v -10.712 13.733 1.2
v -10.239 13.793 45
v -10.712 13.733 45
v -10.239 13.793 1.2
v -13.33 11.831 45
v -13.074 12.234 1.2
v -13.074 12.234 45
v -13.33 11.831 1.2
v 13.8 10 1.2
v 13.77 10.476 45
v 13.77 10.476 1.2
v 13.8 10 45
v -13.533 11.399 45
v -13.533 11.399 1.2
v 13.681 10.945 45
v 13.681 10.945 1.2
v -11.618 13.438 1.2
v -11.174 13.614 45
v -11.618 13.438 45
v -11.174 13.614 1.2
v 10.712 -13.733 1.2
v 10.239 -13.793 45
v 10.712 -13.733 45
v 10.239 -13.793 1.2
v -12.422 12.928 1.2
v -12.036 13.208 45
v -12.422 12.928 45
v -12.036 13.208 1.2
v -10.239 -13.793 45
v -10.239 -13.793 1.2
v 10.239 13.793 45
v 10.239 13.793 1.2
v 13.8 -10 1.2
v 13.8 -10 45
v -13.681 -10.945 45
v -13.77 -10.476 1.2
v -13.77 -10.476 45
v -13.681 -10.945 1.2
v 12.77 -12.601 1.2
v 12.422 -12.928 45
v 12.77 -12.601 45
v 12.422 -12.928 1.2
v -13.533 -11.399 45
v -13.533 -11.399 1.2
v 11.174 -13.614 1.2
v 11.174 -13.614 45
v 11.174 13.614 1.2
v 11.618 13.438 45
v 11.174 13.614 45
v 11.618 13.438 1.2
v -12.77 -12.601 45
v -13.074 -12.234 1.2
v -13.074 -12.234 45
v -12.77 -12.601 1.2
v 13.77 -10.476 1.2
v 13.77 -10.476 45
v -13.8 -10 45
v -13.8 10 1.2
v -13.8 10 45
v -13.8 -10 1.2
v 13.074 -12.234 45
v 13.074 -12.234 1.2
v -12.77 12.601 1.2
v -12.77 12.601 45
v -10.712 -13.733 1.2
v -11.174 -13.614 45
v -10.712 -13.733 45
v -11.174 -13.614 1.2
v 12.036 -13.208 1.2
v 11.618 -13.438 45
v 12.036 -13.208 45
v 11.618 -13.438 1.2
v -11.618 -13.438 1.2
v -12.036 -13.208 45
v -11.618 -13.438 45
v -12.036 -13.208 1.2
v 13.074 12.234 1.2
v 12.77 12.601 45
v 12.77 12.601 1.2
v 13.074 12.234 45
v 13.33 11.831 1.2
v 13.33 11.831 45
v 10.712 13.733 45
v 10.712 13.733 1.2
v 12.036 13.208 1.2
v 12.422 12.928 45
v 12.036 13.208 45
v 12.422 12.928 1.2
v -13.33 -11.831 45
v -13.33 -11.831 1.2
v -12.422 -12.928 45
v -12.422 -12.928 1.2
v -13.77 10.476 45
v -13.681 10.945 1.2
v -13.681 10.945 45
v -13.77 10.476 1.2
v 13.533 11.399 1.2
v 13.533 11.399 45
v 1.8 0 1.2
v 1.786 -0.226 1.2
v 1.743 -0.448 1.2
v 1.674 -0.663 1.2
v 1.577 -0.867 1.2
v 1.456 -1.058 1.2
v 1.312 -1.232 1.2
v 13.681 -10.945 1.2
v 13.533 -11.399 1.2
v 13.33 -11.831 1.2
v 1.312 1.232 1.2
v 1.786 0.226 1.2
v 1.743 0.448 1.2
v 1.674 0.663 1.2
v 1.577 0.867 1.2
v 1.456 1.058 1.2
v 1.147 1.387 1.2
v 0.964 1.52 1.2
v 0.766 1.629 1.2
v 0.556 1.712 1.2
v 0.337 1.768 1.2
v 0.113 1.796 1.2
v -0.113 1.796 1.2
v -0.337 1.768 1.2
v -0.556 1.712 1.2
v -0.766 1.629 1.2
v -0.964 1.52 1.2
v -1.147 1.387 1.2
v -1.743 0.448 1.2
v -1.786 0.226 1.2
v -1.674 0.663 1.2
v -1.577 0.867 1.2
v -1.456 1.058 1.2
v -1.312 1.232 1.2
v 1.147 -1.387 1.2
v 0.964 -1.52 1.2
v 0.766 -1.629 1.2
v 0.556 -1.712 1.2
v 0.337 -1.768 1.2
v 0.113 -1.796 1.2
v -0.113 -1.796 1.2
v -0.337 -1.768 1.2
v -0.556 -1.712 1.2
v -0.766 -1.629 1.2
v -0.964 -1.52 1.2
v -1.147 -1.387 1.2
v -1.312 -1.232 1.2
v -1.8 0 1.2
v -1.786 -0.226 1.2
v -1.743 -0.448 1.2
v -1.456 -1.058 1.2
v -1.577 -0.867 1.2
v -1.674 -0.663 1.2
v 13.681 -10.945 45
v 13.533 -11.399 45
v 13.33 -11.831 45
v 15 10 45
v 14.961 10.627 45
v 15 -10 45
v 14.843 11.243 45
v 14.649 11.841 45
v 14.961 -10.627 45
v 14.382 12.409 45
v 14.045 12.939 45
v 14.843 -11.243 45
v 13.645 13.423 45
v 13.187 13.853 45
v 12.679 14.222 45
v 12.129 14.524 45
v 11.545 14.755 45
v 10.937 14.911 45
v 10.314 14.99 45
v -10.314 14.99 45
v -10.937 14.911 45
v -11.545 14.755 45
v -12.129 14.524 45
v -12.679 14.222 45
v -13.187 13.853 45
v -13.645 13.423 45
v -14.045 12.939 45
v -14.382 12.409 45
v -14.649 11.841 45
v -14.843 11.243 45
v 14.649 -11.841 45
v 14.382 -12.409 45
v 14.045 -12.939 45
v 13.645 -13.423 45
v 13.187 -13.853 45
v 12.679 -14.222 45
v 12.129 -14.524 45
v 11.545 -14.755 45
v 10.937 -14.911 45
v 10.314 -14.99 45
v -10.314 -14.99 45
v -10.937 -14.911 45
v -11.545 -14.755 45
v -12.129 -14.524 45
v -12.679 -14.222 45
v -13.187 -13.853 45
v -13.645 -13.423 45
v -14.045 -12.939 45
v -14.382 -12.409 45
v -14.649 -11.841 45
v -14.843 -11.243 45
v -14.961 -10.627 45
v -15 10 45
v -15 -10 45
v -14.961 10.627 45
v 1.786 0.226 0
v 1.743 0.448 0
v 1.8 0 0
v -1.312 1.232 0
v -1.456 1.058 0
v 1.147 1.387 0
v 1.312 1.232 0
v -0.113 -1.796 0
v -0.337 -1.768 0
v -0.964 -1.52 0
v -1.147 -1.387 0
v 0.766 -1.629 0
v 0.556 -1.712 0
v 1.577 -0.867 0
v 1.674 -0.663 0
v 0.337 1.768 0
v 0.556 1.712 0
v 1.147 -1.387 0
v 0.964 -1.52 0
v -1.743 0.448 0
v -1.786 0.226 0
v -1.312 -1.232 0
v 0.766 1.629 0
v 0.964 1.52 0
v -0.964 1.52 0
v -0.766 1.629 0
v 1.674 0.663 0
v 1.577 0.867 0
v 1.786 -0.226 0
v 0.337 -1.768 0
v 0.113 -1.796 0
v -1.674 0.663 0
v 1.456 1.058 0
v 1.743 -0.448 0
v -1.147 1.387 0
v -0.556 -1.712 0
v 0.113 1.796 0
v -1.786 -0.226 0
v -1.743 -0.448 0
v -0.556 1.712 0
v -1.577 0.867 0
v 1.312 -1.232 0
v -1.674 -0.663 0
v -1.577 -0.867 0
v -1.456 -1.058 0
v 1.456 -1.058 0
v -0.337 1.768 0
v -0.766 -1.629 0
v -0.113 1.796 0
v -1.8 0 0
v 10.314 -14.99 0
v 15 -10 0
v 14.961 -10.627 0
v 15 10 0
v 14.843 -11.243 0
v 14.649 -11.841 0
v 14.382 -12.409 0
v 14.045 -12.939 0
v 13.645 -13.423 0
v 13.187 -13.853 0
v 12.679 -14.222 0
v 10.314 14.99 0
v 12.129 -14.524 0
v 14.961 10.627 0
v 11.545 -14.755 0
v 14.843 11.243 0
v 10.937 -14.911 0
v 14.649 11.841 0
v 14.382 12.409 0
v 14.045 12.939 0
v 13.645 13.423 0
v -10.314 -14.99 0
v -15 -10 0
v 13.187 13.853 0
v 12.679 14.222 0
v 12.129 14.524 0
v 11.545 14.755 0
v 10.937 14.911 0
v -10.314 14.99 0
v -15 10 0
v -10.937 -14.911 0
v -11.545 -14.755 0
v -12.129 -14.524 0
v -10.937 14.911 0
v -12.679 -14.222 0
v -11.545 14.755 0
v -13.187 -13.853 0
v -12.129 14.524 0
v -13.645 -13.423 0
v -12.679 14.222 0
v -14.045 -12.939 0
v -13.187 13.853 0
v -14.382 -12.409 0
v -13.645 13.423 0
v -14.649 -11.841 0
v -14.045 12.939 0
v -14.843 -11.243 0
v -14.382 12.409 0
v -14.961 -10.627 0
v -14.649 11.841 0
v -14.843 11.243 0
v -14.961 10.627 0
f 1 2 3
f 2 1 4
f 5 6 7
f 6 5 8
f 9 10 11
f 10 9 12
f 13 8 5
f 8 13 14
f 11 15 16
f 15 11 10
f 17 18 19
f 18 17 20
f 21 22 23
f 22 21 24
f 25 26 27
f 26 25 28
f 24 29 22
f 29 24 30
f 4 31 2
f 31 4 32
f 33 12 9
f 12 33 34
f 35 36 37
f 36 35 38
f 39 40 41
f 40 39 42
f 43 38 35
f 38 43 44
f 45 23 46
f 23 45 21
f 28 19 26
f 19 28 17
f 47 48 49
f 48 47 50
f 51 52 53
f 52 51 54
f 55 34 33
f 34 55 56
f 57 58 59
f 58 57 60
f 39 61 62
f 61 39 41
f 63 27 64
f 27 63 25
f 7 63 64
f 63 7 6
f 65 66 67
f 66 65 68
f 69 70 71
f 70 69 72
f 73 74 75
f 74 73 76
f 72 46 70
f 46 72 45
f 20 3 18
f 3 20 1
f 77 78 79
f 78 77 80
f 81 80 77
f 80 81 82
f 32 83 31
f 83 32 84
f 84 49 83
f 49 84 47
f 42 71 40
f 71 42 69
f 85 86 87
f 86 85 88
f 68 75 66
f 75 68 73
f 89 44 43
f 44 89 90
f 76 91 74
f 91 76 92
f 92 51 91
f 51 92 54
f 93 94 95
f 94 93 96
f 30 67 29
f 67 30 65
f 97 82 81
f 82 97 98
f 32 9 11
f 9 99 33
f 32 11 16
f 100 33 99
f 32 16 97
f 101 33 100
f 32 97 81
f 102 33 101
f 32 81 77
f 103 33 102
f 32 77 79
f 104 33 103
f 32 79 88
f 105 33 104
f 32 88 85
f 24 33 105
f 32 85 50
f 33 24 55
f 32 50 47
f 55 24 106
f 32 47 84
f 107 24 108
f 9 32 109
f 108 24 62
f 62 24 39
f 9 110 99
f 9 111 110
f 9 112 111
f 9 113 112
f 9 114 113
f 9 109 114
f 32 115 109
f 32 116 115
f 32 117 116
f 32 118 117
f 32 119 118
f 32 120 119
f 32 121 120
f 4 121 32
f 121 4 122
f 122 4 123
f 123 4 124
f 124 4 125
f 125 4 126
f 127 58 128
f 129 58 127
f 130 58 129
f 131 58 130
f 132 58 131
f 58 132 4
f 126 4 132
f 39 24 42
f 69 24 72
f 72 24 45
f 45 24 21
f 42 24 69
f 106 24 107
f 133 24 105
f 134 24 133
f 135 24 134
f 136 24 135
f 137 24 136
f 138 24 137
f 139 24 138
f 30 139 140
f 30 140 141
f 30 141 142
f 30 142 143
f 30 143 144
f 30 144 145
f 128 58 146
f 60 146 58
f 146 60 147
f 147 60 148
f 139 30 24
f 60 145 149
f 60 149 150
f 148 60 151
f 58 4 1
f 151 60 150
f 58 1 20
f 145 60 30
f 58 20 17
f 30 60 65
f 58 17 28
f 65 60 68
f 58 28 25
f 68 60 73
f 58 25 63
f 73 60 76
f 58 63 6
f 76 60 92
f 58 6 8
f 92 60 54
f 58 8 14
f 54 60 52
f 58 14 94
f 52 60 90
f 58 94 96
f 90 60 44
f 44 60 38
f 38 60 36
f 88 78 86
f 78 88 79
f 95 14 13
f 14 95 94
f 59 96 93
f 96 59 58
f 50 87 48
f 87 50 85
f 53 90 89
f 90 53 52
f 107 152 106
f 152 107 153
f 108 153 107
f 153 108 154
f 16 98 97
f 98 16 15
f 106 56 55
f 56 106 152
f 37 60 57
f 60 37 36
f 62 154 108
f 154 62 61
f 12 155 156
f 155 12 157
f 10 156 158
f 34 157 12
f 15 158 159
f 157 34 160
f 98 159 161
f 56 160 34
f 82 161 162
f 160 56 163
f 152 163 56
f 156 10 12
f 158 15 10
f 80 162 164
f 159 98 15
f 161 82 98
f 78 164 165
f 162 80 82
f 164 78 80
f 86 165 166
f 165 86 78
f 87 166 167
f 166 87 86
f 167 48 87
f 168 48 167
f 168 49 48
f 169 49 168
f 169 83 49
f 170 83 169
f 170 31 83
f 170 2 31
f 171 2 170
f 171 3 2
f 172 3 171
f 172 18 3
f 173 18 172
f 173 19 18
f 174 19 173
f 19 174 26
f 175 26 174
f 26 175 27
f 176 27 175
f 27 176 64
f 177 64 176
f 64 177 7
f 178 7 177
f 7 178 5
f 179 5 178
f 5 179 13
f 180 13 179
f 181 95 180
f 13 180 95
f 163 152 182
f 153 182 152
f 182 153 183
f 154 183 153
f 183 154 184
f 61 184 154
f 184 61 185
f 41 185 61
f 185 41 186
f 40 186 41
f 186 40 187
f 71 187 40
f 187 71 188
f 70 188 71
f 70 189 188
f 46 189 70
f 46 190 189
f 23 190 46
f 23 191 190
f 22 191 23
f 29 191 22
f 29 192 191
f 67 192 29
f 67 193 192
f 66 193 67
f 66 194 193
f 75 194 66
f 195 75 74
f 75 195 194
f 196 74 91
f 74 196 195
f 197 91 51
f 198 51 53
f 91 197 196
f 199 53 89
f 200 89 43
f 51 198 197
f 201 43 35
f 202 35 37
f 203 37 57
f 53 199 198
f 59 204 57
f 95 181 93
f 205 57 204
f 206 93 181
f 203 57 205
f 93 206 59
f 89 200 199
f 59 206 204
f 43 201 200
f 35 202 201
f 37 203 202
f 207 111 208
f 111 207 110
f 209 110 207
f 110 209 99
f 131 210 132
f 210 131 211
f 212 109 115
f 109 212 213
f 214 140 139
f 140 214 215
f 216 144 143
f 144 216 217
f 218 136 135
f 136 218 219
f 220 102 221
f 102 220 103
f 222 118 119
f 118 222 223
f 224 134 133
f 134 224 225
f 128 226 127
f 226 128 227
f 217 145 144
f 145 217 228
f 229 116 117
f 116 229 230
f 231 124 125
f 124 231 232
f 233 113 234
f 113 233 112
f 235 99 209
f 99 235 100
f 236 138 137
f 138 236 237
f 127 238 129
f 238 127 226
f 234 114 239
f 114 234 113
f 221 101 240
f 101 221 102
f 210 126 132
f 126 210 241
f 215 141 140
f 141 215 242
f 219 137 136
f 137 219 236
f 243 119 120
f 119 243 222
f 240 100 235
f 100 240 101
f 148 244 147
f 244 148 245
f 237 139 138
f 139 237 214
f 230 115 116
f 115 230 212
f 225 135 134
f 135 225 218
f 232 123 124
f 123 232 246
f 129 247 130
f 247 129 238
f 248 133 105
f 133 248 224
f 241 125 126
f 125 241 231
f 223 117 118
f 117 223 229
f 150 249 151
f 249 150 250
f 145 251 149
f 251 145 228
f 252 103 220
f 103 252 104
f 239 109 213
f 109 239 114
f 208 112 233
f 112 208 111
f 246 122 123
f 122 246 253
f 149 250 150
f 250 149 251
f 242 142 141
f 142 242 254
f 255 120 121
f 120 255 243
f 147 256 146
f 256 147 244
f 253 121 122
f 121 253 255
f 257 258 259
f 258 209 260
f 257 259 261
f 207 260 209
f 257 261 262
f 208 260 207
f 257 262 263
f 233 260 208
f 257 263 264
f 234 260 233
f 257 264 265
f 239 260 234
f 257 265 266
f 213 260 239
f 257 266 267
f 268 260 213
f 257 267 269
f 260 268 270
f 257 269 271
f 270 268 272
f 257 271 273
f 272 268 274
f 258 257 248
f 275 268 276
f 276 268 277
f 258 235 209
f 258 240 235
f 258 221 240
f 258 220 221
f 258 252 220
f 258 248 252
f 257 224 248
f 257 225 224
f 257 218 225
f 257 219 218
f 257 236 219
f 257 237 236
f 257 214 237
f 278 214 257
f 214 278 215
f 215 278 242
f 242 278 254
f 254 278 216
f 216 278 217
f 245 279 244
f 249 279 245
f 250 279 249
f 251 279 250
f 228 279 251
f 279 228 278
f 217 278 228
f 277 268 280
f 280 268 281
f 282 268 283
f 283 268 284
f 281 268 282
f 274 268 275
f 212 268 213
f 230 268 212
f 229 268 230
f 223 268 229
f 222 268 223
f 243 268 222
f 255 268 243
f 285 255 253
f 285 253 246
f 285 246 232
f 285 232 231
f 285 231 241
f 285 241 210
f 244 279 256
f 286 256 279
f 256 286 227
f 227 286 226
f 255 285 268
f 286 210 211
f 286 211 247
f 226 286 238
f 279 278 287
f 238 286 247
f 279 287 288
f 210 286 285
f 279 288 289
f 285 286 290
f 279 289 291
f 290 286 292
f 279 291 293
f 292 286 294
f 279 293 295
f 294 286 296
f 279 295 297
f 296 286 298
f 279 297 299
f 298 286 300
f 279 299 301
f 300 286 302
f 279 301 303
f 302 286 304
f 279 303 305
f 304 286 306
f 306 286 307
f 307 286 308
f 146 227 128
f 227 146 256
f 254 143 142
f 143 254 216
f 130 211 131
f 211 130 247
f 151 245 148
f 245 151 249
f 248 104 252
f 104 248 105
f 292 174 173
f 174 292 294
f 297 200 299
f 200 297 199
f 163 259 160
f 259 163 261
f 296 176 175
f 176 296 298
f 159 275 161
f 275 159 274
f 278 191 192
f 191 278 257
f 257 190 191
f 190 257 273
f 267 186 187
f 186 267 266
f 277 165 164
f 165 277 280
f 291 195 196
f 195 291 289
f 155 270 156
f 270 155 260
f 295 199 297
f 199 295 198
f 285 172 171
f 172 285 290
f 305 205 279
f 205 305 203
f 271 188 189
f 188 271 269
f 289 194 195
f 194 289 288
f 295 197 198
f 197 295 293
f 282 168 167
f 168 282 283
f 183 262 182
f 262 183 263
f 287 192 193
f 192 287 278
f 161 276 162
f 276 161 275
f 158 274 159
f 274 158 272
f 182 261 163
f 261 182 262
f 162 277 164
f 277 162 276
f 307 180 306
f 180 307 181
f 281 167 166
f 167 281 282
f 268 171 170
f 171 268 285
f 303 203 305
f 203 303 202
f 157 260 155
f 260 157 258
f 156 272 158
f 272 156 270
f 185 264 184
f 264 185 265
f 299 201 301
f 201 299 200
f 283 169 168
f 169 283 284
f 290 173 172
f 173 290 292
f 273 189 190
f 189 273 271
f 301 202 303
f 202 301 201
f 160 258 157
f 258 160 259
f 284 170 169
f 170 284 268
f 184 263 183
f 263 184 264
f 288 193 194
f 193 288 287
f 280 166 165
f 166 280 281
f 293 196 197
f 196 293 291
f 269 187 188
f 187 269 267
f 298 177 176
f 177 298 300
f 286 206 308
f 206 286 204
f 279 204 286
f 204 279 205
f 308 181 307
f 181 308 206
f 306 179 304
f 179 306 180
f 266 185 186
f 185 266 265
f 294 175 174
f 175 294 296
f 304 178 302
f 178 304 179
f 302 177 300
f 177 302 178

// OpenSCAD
$fn = 50;


difference() {
	union() {
		hull() {
			translate(v = [-10.0000000000, 10.0000000000, 0]) {
				cylinder(h = 45, r = 5);
			}
			translate(v = [10.0000000000, 10.0000000000, 0]) {
				cylinder(h = 45, r = 5);
			}
			translate(v = [-10.0000000000, -10.0000000000, 0]) {
				cylinder(h = 45, r = 5);
			}
			translate(v = [10.0000000000, -10.0000000000, 0]) {
				cylinder(h = 45, r = 5);
			}
		}
	}
	union() {
		translate(v = [0, 0, 1.2000000000]) {
			hull() {
				translate(v = [-10.0000000000, 10.0000000000, 0]) {
					cylinder(h = 43.8000000000, r = 3.8000000000);
				}
				translate(v = [10.0000000000, 10.0000000000, 0]) {
					cylinder(h = 43.8000000000, r = 3.8000000000);
				}
				translate(v = [-10.0000000000, -10.0000000000, 0]) {
					cylinder(h = 43.8000000000, r = 3.8000000000);
				}
				translate(v = [10.0000000000, -10.0000000000, 0]) {
					cylinder(h = 43.8000000000, r = 3.8000000000);
				}
			}
		}
		#cylinder(h = 1.2000000000, r = 1.8000000000);
	}
}
